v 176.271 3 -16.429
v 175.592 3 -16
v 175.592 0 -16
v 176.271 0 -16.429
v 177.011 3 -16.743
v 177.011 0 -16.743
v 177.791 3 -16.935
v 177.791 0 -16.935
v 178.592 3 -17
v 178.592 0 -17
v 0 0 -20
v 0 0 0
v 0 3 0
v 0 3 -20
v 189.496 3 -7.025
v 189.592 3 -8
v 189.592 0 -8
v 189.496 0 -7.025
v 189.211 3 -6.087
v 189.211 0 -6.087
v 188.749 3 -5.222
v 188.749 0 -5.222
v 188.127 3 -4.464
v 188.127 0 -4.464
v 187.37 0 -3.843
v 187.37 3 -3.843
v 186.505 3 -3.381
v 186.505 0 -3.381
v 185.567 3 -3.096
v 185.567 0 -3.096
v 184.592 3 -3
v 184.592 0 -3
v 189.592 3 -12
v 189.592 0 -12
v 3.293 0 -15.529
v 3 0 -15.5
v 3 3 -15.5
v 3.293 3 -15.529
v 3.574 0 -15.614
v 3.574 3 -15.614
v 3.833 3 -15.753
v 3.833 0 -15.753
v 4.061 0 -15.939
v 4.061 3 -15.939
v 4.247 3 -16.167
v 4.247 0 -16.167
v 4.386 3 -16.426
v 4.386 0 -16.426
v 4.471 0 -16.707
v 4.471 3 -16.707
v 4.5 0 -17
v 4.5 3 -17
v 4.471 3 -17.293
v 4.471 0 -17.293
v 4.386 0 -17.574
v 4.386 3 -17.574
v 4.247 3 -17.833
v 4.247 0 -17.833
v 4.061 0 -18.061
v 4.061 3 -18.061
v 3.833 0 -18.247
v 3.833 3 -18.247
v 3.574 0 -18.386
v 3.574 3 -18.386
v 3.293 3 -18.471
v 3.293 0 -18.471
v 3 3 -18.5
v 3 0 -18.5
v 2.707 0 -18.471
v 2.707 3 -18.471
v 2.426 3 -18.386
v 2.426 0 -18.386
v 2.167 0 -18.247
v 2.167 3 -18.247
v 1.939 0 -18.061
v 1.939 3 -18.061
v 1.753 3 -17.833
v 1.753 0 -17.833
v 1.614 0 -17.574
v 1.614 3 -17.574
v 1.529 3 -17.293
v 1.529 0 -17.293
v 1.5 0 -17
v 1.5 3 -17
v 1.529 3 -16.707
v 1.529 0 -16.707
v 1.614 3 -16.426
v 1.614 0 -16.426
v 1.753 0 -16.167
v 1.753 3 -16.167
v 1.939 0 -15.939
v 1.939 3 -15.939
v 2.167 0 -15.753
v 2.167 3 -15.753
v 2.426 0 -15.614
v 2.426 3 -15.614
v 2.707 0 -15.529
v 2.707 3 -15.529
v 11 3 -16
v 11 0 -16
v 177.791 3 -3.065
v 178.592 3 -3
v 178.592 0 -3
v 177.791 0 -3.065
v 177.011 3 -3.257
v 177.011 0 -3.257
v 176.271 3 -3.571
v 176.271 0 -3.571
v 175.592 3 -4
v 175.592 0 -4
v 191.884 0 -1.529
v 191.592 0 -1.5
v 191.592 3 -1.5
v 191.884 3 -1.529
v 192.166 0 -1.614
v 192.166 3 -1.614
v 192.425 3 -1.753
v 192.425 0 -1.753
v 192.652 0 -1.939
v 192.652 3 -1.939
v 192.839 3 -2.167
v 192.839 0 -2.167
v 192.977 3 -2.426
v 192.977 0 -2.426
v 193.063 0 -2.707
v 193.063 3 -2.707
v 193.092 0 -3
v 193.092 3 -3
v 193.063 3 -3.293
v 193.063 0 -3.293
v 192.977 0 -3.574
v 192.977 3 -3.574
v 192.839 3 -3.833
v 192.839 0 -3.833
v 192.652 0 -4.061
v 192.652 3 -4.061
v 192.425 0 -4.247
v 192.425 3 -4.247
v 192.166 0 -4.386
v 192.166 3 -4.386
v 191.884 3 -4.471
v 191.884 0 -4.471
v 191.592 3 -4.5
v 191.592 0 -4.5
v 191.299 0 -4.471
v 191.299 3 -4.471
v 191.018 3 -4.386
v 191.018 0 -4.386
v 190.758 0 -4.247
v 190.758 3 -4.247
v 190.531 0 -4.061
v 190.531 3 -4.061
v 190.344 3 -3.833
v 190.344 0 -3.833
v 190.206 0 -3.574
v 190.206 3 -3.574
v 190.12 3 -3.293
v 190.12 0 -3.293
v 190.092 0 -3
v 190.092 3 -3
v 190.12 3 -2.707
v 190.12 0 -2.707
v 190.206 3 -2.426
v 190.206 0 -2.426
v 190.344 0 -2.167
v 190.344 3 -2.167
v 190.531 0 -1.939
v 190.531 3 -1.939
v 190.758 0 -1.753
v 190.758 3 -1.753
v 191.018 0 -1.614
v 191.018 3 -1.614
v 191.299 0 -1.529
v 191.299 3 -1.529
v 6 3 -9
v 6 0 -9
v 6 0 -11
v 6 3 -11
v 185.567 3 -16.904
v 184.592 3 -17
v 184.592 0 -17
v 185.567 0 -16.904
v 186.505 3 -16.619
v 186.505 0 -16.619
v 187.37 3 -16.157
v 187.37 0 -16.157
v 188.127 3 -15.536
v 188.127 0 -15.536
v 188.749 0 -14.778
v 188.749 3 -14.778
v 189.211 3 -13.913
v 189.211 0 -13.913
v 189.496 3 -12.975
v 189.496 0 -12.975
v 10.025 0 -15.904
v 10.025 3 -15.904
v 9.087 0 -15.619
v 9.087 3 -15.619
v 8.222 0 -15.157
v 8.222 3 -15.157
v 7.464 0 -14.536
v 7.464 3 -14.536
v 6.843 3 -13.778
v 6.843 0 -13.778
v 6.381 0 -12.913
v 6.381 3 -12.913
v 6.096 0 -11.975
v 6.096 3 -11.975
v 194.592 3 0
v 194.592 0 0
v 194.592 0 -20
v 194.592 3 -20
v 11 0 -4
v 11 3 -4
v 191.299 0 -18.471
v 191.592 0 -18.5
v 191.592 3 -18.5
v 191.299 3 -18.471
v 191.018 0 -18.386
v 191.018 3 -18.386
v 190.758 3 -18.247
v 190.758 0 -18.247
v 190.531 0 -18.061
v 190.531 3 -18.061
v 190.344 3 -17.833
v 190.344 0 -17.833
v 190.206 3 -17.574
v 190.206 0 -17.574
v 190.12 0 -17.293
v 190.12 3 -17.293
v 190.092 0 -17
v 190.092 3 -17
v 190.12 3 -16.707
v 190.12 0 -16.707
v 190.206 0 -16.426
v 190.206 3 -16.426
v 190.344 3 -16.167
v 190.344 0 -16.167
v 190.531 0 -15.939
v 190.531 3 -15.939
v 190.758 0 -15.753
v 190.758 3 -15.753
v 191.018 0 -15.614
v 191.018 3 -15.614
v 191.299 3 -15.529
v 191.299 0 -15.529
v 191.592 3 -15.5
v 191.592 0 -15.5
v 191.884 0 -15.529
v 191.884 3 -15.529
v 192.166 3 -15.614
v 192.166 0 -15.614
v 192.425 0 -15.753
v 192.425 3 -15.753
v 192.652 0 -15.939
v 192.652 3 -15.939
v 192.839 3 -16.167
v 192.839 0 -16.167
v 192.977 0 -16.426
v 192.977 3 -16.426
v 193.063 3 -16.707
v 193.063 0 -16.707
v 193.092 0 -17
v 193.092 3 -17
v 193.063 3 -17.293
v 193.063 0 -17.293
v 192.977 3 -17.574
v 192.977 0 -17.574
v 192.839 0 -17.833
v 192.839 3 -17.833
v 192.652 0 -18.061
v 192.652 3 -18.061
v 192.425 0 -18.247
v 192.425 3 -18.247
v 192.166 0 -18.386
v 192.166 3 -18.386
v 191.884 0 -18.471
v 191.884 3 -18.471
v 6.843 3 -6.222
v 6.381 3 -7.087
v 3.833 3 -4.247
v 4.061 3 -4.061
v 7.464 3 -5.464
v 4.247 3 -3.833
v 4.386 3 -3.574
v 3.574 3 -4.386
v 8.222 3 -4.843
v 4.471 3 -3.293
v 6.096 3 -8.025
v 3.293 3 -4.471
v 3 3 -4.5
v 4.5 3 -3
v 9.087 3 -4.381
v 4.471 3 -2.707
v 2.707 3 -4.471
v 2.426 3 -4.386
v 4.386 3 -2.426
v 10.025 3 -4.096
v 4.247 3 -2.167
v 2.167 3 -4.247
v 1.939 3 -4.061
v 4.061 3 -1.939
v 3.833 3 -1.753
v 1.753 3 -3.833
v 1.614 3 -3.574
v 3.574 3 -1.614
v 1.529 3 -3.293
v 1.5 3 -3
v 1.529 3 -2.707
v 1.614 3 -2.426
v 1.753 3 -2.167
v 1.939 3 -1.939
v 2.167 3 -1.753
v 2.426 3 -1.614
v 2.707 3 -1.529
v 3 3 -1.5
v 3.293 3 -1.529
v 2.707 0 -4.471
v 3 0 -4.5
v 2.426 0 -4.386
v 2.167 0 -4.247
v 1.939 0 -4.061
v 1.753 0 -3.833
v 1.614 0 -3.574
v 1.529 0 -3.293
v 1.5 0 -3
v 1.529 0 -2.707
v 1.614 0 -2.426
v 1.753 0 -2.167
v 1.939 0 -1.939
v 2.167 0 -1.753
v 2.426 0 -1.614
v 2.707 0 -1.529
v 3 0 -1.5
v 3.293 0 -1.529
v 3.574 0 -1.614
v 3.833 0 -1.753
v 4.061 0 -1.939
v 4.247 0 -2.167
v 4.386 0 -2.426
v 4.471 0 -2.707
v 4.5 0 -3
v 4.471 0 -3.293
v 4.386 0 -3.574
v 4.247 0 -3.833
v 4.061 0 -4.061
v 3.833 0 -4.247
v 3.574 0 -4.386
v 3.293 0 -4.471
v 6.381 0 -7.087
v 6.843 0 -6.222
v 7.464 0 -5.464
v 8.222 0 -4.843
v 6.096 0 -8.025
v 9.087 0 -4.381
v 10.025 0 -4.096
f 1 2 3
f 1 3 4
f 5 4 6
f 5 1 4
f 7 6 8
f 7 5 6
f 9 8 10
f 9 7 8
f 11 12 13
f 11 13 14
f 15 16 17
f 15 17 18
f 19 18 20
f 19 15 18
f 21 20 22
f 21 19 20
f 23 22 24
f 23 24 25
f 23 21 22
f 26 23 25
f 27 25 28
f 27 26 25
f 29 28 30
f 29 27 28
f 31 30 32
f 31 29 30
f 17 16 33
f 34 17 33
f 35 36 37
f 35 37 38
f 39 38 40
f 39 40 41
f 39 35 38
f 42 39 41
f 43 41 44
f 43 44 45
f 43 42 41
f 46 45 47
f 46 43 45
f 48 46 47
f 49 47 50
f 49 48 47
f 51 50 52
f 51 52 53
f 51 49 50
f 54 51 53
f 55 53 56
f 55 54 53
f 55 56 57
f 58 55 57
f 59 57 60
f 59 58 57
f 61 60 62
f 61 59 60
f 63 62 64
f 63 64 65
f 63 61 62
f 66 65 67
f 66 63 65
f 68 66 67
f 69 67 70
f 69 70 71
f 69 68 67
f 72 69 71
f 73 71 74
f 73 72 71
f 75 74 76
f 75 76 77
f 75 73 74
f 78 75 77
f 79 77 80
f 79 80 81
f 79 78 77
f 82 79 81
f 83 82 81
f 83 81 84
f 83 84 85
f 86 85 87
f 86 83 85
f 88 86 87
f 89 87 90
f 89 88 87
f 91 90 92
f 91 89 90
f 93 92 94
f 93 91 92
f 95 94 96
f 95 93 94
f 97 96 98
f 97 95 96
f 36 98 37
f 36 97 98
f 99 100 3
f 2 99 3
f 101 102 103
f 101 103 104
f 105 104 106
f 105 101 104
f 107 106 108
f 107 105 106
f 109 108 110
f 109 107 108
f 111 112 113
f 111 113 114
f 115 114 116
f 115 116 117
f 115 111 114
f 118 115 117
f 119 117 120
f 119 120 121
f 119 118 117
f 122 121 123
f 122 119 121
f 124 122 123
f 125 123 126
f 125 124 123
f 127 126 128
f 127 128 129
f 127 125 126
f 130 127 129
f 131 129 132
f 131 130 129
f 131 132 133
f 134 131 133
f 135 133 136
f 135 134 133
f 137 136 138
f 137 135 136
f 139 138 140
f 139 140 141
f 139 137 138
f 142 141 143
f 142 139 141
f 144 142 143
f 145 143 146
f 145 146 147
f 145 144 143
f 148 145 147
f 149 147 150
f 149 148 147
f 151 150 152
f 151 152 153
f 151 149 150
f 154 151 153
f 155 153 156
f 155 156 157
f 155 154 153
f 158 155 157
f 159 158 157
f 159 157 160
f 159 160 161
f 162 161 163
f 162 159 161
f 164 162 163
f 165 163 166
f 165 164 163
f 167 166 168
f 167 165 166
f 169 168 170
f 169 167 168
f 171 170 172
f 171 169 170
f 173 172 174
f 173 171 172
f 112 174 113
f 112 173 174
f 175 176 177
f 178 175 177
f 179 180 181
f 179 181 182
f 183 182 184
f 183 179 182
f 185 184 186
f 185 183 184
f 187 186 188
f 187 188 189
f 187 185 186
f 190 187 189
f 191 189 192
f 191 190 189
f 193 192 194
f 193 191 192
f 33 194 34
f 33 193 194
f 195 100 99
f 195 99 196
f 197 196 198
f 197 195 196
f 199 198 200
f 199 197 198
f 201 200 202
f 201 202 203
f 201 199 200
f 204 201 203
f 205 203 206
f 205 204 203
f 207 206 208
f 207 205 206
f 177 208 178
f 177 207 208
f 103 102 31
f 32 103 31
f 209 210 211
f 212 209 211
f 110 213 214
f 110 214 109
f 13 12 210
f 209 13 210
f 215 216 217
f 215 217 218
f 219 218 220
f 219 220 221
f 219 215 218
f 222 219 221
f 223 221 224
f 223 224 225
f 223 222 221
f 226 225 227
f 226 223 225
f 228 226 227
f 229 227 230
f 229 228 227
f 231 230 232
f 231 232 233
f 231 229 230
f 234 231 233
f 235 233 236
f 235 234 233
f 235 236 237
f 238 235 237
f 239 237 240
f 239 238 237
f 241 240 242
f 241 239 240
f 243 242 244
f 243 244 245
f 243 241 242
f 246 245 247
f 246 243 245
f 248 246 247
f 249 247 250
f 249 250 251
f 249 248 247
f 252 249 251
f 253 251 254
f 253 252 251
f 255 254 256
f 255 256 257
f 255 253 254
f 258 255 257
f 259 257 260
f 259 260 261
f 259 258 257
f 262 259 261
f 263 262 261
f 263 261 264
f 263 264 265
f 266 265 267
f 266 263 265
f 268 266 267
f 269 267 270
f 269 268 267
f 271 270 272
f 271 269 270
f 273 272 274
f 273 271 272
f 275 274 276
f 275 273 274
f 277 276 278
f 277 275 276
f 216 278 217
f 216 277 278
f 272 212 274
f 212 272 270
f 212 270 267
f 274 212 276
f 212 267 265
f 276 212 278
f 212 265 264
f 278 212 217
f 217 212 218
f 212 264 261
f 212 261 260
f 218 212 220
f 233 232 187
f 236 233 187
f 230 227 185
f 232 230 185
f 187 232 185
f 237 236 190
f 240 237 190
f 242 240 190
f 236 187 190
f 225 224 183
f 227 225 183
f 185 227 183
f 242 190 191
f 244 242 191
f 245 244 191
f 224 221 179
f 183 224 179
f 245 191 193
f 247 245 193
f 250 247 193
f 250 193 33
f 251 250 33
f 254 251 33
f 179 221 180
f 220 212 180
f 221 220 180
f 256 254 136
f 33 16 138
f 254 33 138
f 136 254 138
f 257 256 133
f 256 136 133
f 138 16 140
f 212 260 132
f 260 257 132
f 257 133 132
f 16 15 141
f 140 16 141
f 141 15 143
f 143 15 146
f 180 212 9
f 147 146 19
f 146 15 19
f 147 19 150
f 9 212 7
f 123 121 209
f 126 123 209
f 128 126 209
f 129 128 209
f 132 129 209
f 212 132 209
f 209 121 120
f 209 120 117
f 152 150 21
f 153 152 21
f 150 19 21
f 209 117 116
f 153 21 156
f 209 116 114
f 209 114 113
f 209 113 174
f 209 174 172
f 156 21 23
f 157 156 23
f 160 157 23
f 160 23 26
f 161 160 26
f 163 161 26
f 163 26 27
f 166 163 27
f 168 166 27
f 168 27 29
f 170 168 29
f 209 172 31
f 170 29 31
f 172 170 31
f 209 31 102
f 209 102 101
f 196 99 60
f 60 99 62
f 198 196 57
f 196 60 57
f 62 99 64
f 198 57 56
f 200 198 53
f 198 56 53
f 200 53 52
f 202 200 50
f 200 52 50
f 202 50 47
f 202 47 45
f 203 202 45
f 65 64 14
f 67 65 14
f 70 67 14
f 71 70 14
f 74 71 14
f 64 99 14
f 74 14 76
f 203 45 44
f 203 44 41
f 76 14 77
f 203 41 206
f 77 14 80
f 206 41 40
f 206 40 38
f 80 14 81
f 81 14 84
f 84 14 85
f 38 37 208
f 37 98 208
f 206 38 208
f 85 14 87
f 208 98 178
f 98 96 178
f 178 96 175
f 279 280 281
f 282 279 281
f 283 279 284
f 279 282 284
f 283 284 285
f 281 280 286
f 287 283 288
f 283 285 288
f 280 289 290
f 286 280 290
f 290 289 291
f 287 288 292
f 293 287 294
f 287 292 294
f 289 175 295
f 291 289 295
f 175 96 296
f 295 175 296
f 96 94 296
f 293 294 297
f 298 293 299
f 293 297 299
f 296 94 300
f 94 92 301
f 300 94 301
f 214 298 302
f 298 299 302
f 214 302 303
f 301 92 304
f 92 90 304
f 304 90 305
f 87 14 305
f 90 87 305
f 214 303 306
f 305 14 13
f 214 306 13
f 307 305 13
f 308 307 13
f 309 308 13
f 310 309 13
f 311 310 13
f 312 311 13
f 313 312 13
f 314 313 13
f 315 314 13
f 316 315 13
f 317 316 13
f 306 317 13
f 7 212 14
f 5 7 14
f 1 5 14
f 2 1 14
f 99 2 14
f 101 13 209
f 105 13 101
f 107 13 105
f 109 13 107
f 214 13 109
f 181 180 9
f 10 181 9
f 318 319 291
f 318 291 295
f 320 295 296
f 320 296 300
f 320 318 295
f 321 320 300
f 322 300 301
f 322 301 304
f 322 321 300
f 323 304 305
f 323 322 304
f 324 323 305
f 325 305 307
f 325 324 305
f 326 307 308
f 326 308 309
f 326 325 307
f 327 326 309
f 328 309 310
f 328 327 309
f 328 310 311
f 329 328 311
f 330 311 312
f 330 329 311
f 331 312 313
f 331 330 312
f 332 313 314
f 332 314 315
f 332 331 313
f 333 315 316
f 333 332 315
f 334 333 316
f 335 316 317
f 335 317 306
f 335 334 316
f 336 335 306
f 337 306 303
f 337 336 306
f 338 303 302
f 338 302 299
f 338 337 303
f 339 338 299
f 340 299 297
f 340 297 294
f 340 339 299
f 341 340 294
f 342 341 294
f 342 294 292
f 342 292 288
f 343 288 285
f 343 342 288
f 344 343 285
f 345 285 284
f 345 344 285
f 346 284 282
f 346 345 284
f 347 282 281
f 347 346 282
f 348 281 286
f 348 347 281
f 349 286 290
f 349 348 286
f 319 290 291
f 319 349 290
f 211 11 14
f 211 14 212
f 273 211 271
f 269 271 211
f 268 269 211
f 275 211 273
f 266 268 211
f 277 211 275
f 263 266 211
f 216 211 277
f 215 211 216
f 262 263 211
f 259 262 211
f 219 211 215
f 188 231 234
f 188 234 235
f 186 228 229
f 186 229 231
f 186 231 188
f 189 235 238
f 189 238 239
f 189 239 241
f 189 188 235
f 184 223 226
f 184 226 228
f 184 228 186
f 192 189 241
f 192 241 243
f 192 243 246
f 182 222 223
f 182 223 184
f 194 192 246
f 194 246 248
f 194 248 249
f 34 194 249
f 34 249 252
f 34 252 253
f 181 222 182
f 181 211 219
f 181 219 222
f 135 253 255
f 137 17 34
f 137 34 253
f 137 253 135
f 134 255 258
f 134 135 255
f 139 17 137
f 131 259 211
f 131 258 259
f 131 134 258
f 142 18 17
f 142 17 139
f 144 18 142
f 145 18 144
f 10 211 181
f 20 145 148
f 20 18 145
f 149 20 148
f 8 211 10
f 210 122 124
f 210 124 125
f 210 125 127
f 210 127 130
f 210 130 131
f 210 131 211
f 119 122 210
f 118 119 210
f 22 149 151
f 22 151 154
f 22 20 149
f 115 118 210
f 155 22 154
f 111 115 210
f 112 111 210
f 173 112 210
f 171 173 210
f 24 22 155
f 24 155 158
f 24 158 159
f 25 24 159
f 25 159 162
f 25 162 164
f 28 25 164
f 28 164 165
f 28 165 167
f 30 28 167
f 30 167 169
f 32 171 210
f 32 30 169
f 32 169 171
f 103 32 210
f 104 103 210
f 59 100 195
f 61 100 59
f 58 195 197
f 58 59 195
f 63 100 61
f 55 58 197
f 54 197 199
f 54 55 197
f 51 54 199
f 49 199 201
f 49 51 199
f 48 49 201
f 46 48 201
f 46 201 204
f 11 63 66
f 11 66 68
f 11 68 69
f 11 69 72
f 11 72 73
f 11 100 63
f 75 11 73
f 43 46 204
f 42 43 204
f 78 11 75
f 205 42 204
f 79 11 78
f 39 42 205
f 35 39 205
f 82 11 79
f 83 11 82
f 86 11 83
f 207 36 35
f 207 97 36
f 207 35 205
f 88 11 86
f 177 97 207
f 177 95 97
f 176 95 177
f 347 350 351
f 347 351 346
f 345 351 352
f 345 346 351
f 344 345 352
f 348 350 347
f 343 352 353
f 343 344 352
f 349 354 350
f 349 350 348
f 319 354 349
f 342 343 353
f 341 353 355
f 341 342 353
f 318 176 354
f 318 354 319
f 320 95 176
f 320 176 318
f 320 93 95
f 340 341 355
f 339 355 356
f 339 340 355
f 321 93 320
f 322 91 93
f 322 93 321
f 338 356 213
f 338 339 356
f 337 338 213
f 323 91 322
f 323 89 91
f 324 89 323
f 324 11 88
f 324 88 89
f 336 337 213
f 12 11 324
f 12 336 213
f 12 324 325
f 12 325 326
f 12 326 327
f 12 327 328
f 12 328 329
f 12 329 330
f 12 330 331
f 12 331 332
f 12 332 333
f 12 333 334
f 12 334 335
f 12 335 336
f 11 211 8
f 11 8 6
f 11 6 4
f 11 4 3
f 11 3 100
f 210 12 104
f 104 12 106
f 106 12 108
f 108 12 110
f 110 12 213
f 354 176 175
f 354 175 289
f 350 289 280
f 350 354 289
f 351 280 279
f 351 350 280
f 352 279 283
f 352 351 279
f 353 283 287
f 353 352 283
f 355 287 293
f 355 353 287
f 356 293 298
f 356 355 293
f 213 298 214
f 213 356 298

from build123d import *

# Parameters (mm, degrees)
SKETCH1_W           = 194.591670797
SKETCH1_H           = 20
SKETCH1_R           = 1.5
SKETCH1_W_2         = 182.591670797
SKETCH1_H_2         = 12
BOSS_EXTRUDE1_DEPTH = 3
CUT_EXTRUDE1_DEPTH  = 196.639766774
FILLET1_R           = 5


with BuildPart() as part:
    # Sketch1 → Boss-Extrude1 (new body)
    with BuildSketch(Plane(origin=(0, 0, 0), x_dir=(1, 0, 0), z_dir=(0, 1, 0))):
        with Locations((97.295835399, 10)):
            Rectangle(SKETCH1_W, SKETCH1_H)
        with Locations(Location((3, 17, 0), (0, 0, 270))):
            Circle(SKETCH1_R, mode=Mode.SUBTRACT)
        with Locations(Location((3, 3, 0), (0, 0, 90))):
            Circle(SKETCH1_R, mode=Mode.SUBTRACT)
        with Locations(Location((191.591670797, 3, 0), (0, 0, 270))):
            Circle(SKETCH1_R, mode=Mode.SUBTRACT)
        with Locations(Location((191.591670797, 17, 0), (0, 0, 90))):
            Circle(SKETCH1_R, mode=Mode.SUBTRACT)
        with Locations((97.295835399, 10)):
            Rectangle(SKETCH1_W_2, SKETCH1_H_2, mode=Mode.SUBTRACT)
    extrude(amount=BOSS_EXTRUDE1_DEPTH)

    # Sketch2 → Cut-Extrude1 (cut, through all)
    with BuildSketch(Plane(origin=(0, 3, 0), x_dir=(1, 0, 0), z_dir=(0, 1, 0))):
        Polygon((175.591670797, 17), (175.591670797, 16), (188.591670797, 16), (188.591670797, 4), (175.591670797, 4), (175.591670797, 3), (189.591670797, 3), (189.591670797, 17), align=None)
    extrude(amount=-CUT_EXTRUDE1_DEPTH, mode=Mode.SUBTRACT)

    # Fillet1
    # the kernel refuses this fillet: 5 mm, written as the material it adds along each edge
    with BuildSketch(Plane(origin=(189.591670797, 3, -17), x_dir=(0, 0, 1), z_dir=(0, -1, 0)), Plane(origin=(189.591670797, 3, -3), x_dir=(-1, 0, 0), z_dir=(0, -1, 0)), Plane(origin=(6, 0, -16), x_dir=(0, 0, 1), z_dir=(0, 1, 0))) as fillet1_piece_1:
        with BuildLine():
            CenterArc((FILLET1_R, FILLET1_R), FILLET1_R, 180, 90)
            Line((0, FILLET1_R), (-FILLET1_R * 0.02, FILLET1_R))
            Line((-FILLET1_R * 0.02, FILLET1_R), (-FILLET1_R * 0.02, -FILLET1_R * 0.02))
            Line((-FILLET1_R * 0.02, -FILLET1_R * 0.02), (FILLET1_R, -FILLET1_R * 0.02))
            Line((FILLET1_R, -FILLET1_R * 0.02), (FILLET1_R, 0))
        make_face()
    extrude(amount=3)
    with BuildSketch(Plane(origin=(175.591670797, 3, -17), x_dir=(1, 0, 0), z_dir=(0, -1, 0))) as fillet1_piece_2:
        with BuildLine():
            CenterArc((3, 5), FILLET1_R, 233.130102354, 36.869897646)
            Line((0, 1), (-0.06, 0.92))
            ThreePointArc((-0.06, 0.92), (-0.1, 0.5), (-0.1, 0))
            Line((-0.1, 0), (0, -0.1))
            Line((0, -0.1), (3, -0.1))
            Line((3, -0.1), (3, 0))
        make_face()
    extrude(amount=3)
    with BuildSketch(Plane(origin=(175.591670797, 3, -3), x_dir=(0, 0, -1), z_dir=(0, -1, 0))) as fillet1_piece_3:
        with BuildLine():
            CenterArc((5, 3), FILLET1_R, 180, 36.869897646)
            Line((0, 3), (-0.1, 3))
            Line((-0.1, 3), (-0.1, 0))
            Line((-0.1, 0), (0, -0.1))
            ThreePointArc((0, -0.1), (0.5, -0.1), (0.92, -0.06))
            Line((0.92, -0.06), (1, 0))
        make_face()
    extrude(amount=3)
    with BuildSketch(Plane(origin=(6, 0, -4), x_dir=(0, 0, -1), z_dir=(0, 1, 0))) as fillet1_piece_4:
        with BuildLine():
            CenterArc((FILLET1_R, -FILLET1_R), FILLET1_R, 90, 90)
            Line((0, -FILLET1_R), (-FILLET1_R * 0.02, -FILLET1_R))
            Line((-FILLET1_R * 0.02, -FILLET1_R), (-FILLET1_R * 0.02, FILLET1_R * 0.02))
            Line((-FILLET1_R * 0.02, FILLET1_R * 0.02), (FILLET1_R, FILLET1_R * 0.02))
            Line((FILLET1_R, FILLET1_R * 0.02), (FILLET1_R, 0))
        make_face()
    extrude(amount=3)


solid = part.part
